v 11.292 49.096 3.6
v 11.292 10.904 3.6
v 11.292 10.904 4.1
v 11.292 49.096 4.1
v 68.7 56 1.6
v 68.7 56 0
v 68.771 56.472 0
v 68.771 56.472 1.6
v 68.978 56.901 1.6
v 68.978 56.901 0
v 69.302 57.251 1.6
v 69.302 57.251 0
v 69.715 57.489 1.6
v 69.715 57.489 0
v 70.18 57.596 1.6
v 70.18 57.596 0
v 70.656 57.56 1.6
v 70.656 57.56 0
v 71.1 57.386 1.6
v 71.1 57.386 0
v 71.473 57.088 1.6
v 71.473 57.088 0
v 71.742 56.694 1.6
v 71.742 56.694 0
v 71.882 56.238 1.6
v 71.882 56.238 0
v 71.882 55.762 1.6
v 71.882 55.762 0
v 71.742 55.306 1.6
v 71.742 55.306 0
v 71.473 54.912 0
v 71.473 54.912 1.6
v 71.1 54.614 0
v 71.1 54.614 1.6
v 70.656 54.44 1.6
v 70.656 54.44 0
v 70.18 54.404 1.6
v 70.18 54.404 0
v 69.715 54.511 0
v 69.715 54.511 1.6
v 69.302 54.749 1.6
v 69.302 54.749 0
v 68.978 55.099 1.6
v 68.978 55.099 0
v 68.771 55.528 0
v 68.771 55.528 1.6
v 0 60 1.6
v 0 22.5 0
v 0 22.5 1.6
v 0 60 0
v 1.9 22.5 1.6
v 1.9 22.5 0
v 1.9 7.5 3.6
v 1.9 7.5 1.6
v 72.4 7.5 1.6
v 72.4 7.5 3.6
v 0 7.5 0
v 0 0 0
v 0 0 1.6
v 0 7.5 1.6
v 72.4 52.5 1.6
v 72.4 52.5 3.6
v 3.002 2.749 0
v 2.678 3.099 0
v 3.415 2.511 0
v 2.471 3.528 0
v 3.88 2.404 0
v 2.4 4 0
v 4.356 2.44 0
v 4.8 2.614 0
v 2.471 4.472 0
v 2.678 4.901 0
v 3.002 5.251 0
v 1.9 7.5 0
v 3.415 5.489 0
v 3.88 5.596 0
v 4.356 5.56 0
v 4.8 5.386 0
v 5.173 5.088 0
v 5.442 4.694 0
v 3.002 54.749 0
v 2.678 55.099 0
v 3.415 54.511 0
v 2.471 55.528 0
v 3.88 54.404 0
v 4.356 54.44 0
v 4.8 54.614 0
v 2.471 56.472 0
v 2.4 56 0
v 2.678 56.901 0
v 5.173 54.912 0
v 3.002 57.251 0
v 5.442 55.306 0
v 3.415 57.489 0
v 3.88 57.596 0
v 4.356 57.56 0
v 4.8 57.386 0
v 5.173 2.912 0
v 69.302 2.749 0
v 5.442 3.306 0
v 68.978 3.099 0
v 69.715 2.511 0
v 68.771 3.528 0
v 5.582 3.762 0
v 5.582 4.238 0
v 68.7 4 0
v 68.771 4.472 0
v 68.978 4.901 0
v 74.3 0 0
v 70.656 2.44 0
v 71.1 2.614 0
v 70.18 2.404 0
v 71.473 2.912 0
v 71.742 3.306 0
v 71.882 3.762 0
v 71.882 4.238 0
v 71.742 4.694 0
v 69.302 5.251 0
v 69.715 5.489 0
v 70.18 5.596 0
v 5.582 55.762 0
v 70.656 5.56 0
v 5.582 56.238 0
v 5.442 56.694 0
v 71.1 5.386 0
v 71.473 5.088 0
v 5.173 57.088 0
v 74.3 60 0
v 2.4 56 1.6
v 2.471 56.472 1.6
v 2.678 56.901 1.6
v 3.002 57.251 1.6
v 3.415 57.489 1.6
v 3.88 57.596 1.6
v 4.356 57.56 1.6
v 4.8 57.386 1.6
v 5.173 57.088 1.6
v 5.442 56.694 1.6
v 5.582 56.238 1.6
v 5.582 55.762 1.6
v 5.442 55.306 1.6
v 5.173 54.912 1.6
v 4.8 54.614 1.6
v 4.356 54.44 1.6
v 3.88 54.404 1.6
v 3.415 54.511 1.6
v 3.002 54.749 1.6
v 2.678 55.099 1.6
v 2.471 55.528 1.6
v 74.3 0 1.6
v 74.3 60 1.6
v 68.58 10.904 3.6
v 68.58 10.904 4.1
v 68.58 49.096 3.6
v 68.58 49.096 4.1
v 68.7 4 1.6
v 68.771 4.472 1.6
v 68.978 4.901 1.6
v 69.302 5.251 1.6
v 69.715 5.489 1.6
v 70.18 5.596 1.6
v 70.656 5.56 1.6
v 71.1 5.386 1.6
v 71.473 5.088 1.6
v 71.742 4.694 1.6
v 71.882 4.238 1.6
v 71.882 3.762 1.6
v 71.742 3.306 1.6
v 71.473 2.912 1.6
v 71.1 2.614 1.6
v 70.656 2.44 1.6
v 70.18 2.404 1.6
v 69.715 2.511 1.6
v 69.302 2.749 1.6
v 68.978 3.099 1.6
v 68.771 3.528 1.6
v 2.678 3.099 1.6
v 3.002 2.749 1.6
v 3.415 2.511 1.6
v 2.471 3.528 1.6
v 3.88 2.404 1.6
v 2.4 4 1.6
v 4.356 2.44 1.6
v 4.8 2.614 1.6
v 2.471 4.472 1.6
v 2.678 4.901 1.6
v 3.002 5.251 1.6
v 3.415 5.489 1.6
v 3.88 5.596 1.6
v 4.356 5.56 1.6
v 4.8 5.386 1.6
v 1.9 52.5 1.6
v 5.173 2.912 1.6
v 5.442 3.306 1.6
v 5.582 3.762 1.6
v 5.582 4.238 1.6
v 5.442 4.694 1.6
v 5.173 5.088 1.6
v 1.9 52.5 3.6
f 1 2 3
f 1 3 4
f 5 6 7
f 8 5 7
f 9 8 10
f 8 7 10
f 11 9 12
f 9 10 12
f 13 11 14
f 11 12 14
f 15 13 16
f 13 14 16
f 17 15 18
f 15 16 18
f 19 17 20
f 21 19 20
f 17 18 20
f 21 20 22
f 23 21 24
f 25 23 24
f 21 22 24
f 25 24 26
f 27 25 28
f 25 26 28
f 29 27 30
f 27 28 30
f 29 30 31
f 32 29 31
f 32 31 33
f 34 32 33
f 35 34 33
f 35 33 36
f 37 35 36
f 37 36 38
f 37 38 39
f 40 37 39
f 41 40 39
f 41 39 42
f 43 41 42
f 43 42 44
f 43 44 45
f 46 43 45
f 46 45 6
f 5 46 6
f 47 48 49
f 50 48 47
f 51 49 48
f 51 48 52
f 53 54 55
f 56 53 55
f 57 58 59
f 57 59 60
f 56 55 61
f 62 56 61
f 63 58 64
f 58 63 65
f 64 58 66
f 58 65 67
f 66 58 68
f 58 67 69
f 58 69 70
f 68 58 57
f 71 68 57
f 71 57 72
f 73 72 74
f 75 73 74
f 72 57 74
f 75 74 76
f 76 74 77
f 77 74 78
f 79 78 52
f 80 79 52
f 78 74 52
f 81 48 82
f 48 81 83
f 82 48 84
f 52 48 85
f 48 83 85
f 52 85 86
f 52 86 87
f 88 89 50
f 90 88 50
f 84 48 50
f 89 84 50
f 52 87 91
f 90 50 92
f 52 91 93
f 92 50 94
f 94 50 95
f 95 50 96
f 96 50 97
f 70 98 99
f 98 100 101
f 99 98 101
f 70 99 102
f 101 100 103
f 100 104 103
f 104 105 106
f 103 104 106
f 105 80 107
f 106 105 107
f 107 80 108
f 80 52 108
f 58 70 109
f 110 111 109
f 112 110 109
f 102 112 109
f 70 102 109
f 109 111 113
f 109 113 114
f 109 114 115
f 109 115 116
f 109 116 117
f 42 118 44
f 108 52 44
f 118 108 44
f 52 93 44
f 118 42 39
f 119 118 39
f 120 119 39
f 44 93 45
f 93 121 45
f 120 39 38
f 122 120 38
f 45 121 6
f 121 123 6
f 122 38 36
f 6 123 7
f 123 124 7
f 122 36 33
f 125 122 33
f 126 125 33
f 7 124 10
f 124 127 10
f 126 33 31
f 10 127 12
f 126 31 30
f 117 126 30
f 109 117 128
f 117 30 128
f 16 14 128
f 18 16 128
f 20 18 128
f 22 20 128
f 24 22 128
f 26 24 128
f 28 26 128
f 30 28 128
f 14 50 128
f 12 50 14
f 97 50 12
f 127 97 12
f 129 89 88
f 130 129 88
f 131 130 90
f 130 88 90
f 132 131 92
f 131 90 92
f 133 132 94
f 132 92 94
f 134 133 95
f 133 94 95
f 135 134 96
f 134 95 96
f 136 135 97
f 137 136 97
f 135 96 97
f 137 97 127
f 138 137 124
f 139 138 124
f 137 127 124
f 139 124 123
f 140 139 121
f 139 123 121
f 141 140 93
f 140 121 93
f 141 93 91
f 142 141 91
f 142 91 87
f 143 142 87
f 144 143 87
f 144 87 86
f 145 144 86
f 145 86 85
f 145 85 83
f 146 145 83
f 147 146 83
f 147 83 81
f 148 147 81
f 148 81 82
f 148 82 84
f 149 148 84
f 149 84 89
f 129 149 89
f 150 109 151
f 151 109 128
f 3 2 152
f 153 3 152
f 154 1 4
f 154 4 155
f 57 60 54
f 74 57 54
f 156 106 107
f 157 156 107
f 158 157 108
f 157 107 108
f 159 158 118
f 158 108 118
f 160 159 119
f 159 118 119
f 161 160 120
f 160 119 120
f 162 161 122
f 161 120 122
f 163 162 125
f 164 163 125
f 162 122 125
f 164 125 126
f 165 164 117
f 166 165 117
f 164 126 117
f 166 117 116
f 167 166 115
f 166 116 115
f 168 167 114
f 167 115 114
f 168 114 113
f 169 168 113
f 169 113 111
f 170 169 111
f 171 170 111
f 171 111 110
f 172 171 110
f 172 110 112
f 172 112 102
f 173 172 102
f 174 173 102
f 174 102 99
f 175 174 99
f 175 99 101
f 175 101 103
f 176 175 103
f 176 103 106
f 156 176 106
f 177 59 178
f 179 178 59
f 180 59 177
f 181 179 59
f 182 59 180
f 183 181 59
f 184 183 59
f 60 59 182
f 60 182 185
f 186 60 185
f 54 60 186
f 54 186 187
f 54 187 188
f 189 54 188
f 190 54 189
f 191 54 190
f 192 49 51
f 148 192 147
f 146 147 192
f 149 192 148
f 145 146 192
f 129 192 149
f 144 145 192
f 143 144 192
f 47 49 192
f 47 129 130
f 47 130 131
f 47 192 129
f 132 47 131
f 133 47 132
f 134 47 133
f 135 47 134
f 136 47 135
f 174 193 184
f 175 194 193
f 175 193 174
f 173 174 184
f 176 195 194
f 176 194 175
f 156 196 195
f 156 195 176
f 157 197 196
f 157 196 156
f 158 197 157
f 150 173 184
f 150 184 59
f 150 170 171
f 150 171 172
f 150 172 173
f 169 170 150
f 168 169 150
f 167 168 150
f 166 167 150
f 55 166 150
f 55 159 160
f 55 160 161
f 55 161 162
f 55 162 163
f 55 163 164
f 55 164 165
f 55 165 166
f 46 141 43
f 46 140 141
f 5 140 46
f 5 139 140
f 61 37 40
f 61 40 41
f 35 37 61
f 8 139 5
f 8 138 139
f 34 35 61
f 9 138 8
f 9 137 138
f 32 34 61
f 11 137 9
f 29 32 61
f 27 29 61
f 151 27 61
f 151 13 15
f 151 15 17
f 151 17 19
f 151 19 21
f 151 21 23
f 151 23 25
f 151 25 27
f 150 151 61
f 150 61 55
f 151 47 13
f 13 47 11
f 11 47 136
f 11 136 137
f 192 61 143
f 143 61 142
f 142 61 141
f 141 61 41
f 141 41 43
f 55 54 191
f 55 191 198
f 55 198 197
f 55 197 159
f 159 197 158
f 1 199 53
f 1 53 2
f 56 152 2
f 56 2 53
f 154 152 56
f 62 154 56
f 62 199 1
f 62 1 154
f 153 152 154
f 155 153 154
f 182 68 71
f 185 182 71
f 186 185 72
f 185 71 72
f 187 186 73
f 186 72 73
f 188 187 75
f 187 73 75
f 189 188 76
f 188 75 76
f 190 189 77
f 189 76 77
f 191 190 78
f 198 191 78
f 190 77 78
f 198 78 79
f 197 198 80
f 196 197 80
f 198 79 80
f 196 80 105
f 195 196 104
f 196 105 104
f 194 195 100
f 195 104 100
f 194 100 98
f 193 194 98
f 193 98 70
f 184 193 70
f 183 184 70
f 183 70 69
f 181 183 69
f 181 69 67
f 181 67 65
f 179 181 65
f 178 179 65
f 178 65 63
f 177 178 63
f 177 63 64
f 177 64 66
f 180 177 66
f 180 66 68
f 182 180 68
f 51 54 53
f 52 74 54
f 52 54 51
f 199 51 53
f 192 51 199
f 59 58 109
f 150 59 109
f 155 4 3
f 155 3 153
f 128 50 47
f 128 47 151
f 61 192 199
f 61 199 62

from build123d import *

# Parameters (mm, degrees)
SKETCH1_W                      = 74.3
SKETCH1_H                      = 60
BOSS_EXTRUDE1_DEPTH            = 1.6
SKETCH2_W                      = 1.9
SKETCH2_H                      = 15
CUT_EXTRUDE1_DEPTH             = 2.6
F_3_2_3_2_DIAMETER_HOLE1_D     = 3.2
F_3_2_3_2_DIAMETER_HOLE1_DEPTH = 60
F_3_2_3_2_DIAMETER_HOLE1_TIP   = 0.96137699
SKETCH6_W                      = 70.5
SKETCH6_H                      = 45
BOSS_EXTRUDE2_DEPTH            = 2
SKETCH7_W                      = 57.288
SKETCH7_H                      = 38.192
BOSS_EXTRUDE3_DEPTH            = 0.5


with BuildPart() as part:
    # Sketch1 → Boss-Extrude1 (new body)
    with BuildSketch(Plane.XY):
        with Locations((37.15, 30)):
            Rectangle(SKETCH1_W, SKETCH1_H)
    extrude(amount=BOSS_EXTRUDE1_DEPTH)

    # Sketch2 → Cut-Extrude1 (cut, through all)
    with BuildSketch(Plane.XY.offset(1.6)):
        with Locations((0.95, 15)):
            Rectangle(SKETCH2_W, SKETCH2_H)
    extrude(amount=-CUT_EXTRUDE1_DEPTH, mode=Mode.SUBTRACT)

    # Ø3.2 (3.2) Diameter Hole1
    with Locations(Plane.XY.offset(1.6)):
        with Locations((4, 56), (70.3, 56), (70.3, 4), (4, 4)):
            Hole(F_3_2_3_2_DIAMETER_HOLE1_D / 2, depth=F_3_2_3_2_DIAMETER_HOLE1_DEPTH)
            with Locations((0, 0, -(F_3_2_3_2_DIAMETER_HOLE1_DEPTH + F_3_2_3_2_DIAMETER_HOLE1_TIP / 2))):  # 118° drill point
                Cone(0, F_3_2_3_2_DIAMETER_HOLE1_D / 2, F_3_2_3_2_DIAMETER_HOLE1_TIP, mode=Mode.SUBTRACT)

    # Sketch6 → Boss-Extrude2 (add)
    with BuildSketch(Plane.XY.offset(1.6)):
        with Locations((37.15, 30)):
            Rectangle(SKETCH6_W, SKETCH6_H)
    extrude(amount=BOSS_EXTRUDE2_DEPTH)

    # Sketch7 → Boss-Extrude3 (add)
    with BuildSketch(Plane.XY.offset(3.6)):
        with Locations((39.936, 30)):
            Rectangle(SKETCH7_W, SKETCH7_H)
    extrude(amount=BOSS_EXTRUDE3_DEPTH)


solid = part.part
